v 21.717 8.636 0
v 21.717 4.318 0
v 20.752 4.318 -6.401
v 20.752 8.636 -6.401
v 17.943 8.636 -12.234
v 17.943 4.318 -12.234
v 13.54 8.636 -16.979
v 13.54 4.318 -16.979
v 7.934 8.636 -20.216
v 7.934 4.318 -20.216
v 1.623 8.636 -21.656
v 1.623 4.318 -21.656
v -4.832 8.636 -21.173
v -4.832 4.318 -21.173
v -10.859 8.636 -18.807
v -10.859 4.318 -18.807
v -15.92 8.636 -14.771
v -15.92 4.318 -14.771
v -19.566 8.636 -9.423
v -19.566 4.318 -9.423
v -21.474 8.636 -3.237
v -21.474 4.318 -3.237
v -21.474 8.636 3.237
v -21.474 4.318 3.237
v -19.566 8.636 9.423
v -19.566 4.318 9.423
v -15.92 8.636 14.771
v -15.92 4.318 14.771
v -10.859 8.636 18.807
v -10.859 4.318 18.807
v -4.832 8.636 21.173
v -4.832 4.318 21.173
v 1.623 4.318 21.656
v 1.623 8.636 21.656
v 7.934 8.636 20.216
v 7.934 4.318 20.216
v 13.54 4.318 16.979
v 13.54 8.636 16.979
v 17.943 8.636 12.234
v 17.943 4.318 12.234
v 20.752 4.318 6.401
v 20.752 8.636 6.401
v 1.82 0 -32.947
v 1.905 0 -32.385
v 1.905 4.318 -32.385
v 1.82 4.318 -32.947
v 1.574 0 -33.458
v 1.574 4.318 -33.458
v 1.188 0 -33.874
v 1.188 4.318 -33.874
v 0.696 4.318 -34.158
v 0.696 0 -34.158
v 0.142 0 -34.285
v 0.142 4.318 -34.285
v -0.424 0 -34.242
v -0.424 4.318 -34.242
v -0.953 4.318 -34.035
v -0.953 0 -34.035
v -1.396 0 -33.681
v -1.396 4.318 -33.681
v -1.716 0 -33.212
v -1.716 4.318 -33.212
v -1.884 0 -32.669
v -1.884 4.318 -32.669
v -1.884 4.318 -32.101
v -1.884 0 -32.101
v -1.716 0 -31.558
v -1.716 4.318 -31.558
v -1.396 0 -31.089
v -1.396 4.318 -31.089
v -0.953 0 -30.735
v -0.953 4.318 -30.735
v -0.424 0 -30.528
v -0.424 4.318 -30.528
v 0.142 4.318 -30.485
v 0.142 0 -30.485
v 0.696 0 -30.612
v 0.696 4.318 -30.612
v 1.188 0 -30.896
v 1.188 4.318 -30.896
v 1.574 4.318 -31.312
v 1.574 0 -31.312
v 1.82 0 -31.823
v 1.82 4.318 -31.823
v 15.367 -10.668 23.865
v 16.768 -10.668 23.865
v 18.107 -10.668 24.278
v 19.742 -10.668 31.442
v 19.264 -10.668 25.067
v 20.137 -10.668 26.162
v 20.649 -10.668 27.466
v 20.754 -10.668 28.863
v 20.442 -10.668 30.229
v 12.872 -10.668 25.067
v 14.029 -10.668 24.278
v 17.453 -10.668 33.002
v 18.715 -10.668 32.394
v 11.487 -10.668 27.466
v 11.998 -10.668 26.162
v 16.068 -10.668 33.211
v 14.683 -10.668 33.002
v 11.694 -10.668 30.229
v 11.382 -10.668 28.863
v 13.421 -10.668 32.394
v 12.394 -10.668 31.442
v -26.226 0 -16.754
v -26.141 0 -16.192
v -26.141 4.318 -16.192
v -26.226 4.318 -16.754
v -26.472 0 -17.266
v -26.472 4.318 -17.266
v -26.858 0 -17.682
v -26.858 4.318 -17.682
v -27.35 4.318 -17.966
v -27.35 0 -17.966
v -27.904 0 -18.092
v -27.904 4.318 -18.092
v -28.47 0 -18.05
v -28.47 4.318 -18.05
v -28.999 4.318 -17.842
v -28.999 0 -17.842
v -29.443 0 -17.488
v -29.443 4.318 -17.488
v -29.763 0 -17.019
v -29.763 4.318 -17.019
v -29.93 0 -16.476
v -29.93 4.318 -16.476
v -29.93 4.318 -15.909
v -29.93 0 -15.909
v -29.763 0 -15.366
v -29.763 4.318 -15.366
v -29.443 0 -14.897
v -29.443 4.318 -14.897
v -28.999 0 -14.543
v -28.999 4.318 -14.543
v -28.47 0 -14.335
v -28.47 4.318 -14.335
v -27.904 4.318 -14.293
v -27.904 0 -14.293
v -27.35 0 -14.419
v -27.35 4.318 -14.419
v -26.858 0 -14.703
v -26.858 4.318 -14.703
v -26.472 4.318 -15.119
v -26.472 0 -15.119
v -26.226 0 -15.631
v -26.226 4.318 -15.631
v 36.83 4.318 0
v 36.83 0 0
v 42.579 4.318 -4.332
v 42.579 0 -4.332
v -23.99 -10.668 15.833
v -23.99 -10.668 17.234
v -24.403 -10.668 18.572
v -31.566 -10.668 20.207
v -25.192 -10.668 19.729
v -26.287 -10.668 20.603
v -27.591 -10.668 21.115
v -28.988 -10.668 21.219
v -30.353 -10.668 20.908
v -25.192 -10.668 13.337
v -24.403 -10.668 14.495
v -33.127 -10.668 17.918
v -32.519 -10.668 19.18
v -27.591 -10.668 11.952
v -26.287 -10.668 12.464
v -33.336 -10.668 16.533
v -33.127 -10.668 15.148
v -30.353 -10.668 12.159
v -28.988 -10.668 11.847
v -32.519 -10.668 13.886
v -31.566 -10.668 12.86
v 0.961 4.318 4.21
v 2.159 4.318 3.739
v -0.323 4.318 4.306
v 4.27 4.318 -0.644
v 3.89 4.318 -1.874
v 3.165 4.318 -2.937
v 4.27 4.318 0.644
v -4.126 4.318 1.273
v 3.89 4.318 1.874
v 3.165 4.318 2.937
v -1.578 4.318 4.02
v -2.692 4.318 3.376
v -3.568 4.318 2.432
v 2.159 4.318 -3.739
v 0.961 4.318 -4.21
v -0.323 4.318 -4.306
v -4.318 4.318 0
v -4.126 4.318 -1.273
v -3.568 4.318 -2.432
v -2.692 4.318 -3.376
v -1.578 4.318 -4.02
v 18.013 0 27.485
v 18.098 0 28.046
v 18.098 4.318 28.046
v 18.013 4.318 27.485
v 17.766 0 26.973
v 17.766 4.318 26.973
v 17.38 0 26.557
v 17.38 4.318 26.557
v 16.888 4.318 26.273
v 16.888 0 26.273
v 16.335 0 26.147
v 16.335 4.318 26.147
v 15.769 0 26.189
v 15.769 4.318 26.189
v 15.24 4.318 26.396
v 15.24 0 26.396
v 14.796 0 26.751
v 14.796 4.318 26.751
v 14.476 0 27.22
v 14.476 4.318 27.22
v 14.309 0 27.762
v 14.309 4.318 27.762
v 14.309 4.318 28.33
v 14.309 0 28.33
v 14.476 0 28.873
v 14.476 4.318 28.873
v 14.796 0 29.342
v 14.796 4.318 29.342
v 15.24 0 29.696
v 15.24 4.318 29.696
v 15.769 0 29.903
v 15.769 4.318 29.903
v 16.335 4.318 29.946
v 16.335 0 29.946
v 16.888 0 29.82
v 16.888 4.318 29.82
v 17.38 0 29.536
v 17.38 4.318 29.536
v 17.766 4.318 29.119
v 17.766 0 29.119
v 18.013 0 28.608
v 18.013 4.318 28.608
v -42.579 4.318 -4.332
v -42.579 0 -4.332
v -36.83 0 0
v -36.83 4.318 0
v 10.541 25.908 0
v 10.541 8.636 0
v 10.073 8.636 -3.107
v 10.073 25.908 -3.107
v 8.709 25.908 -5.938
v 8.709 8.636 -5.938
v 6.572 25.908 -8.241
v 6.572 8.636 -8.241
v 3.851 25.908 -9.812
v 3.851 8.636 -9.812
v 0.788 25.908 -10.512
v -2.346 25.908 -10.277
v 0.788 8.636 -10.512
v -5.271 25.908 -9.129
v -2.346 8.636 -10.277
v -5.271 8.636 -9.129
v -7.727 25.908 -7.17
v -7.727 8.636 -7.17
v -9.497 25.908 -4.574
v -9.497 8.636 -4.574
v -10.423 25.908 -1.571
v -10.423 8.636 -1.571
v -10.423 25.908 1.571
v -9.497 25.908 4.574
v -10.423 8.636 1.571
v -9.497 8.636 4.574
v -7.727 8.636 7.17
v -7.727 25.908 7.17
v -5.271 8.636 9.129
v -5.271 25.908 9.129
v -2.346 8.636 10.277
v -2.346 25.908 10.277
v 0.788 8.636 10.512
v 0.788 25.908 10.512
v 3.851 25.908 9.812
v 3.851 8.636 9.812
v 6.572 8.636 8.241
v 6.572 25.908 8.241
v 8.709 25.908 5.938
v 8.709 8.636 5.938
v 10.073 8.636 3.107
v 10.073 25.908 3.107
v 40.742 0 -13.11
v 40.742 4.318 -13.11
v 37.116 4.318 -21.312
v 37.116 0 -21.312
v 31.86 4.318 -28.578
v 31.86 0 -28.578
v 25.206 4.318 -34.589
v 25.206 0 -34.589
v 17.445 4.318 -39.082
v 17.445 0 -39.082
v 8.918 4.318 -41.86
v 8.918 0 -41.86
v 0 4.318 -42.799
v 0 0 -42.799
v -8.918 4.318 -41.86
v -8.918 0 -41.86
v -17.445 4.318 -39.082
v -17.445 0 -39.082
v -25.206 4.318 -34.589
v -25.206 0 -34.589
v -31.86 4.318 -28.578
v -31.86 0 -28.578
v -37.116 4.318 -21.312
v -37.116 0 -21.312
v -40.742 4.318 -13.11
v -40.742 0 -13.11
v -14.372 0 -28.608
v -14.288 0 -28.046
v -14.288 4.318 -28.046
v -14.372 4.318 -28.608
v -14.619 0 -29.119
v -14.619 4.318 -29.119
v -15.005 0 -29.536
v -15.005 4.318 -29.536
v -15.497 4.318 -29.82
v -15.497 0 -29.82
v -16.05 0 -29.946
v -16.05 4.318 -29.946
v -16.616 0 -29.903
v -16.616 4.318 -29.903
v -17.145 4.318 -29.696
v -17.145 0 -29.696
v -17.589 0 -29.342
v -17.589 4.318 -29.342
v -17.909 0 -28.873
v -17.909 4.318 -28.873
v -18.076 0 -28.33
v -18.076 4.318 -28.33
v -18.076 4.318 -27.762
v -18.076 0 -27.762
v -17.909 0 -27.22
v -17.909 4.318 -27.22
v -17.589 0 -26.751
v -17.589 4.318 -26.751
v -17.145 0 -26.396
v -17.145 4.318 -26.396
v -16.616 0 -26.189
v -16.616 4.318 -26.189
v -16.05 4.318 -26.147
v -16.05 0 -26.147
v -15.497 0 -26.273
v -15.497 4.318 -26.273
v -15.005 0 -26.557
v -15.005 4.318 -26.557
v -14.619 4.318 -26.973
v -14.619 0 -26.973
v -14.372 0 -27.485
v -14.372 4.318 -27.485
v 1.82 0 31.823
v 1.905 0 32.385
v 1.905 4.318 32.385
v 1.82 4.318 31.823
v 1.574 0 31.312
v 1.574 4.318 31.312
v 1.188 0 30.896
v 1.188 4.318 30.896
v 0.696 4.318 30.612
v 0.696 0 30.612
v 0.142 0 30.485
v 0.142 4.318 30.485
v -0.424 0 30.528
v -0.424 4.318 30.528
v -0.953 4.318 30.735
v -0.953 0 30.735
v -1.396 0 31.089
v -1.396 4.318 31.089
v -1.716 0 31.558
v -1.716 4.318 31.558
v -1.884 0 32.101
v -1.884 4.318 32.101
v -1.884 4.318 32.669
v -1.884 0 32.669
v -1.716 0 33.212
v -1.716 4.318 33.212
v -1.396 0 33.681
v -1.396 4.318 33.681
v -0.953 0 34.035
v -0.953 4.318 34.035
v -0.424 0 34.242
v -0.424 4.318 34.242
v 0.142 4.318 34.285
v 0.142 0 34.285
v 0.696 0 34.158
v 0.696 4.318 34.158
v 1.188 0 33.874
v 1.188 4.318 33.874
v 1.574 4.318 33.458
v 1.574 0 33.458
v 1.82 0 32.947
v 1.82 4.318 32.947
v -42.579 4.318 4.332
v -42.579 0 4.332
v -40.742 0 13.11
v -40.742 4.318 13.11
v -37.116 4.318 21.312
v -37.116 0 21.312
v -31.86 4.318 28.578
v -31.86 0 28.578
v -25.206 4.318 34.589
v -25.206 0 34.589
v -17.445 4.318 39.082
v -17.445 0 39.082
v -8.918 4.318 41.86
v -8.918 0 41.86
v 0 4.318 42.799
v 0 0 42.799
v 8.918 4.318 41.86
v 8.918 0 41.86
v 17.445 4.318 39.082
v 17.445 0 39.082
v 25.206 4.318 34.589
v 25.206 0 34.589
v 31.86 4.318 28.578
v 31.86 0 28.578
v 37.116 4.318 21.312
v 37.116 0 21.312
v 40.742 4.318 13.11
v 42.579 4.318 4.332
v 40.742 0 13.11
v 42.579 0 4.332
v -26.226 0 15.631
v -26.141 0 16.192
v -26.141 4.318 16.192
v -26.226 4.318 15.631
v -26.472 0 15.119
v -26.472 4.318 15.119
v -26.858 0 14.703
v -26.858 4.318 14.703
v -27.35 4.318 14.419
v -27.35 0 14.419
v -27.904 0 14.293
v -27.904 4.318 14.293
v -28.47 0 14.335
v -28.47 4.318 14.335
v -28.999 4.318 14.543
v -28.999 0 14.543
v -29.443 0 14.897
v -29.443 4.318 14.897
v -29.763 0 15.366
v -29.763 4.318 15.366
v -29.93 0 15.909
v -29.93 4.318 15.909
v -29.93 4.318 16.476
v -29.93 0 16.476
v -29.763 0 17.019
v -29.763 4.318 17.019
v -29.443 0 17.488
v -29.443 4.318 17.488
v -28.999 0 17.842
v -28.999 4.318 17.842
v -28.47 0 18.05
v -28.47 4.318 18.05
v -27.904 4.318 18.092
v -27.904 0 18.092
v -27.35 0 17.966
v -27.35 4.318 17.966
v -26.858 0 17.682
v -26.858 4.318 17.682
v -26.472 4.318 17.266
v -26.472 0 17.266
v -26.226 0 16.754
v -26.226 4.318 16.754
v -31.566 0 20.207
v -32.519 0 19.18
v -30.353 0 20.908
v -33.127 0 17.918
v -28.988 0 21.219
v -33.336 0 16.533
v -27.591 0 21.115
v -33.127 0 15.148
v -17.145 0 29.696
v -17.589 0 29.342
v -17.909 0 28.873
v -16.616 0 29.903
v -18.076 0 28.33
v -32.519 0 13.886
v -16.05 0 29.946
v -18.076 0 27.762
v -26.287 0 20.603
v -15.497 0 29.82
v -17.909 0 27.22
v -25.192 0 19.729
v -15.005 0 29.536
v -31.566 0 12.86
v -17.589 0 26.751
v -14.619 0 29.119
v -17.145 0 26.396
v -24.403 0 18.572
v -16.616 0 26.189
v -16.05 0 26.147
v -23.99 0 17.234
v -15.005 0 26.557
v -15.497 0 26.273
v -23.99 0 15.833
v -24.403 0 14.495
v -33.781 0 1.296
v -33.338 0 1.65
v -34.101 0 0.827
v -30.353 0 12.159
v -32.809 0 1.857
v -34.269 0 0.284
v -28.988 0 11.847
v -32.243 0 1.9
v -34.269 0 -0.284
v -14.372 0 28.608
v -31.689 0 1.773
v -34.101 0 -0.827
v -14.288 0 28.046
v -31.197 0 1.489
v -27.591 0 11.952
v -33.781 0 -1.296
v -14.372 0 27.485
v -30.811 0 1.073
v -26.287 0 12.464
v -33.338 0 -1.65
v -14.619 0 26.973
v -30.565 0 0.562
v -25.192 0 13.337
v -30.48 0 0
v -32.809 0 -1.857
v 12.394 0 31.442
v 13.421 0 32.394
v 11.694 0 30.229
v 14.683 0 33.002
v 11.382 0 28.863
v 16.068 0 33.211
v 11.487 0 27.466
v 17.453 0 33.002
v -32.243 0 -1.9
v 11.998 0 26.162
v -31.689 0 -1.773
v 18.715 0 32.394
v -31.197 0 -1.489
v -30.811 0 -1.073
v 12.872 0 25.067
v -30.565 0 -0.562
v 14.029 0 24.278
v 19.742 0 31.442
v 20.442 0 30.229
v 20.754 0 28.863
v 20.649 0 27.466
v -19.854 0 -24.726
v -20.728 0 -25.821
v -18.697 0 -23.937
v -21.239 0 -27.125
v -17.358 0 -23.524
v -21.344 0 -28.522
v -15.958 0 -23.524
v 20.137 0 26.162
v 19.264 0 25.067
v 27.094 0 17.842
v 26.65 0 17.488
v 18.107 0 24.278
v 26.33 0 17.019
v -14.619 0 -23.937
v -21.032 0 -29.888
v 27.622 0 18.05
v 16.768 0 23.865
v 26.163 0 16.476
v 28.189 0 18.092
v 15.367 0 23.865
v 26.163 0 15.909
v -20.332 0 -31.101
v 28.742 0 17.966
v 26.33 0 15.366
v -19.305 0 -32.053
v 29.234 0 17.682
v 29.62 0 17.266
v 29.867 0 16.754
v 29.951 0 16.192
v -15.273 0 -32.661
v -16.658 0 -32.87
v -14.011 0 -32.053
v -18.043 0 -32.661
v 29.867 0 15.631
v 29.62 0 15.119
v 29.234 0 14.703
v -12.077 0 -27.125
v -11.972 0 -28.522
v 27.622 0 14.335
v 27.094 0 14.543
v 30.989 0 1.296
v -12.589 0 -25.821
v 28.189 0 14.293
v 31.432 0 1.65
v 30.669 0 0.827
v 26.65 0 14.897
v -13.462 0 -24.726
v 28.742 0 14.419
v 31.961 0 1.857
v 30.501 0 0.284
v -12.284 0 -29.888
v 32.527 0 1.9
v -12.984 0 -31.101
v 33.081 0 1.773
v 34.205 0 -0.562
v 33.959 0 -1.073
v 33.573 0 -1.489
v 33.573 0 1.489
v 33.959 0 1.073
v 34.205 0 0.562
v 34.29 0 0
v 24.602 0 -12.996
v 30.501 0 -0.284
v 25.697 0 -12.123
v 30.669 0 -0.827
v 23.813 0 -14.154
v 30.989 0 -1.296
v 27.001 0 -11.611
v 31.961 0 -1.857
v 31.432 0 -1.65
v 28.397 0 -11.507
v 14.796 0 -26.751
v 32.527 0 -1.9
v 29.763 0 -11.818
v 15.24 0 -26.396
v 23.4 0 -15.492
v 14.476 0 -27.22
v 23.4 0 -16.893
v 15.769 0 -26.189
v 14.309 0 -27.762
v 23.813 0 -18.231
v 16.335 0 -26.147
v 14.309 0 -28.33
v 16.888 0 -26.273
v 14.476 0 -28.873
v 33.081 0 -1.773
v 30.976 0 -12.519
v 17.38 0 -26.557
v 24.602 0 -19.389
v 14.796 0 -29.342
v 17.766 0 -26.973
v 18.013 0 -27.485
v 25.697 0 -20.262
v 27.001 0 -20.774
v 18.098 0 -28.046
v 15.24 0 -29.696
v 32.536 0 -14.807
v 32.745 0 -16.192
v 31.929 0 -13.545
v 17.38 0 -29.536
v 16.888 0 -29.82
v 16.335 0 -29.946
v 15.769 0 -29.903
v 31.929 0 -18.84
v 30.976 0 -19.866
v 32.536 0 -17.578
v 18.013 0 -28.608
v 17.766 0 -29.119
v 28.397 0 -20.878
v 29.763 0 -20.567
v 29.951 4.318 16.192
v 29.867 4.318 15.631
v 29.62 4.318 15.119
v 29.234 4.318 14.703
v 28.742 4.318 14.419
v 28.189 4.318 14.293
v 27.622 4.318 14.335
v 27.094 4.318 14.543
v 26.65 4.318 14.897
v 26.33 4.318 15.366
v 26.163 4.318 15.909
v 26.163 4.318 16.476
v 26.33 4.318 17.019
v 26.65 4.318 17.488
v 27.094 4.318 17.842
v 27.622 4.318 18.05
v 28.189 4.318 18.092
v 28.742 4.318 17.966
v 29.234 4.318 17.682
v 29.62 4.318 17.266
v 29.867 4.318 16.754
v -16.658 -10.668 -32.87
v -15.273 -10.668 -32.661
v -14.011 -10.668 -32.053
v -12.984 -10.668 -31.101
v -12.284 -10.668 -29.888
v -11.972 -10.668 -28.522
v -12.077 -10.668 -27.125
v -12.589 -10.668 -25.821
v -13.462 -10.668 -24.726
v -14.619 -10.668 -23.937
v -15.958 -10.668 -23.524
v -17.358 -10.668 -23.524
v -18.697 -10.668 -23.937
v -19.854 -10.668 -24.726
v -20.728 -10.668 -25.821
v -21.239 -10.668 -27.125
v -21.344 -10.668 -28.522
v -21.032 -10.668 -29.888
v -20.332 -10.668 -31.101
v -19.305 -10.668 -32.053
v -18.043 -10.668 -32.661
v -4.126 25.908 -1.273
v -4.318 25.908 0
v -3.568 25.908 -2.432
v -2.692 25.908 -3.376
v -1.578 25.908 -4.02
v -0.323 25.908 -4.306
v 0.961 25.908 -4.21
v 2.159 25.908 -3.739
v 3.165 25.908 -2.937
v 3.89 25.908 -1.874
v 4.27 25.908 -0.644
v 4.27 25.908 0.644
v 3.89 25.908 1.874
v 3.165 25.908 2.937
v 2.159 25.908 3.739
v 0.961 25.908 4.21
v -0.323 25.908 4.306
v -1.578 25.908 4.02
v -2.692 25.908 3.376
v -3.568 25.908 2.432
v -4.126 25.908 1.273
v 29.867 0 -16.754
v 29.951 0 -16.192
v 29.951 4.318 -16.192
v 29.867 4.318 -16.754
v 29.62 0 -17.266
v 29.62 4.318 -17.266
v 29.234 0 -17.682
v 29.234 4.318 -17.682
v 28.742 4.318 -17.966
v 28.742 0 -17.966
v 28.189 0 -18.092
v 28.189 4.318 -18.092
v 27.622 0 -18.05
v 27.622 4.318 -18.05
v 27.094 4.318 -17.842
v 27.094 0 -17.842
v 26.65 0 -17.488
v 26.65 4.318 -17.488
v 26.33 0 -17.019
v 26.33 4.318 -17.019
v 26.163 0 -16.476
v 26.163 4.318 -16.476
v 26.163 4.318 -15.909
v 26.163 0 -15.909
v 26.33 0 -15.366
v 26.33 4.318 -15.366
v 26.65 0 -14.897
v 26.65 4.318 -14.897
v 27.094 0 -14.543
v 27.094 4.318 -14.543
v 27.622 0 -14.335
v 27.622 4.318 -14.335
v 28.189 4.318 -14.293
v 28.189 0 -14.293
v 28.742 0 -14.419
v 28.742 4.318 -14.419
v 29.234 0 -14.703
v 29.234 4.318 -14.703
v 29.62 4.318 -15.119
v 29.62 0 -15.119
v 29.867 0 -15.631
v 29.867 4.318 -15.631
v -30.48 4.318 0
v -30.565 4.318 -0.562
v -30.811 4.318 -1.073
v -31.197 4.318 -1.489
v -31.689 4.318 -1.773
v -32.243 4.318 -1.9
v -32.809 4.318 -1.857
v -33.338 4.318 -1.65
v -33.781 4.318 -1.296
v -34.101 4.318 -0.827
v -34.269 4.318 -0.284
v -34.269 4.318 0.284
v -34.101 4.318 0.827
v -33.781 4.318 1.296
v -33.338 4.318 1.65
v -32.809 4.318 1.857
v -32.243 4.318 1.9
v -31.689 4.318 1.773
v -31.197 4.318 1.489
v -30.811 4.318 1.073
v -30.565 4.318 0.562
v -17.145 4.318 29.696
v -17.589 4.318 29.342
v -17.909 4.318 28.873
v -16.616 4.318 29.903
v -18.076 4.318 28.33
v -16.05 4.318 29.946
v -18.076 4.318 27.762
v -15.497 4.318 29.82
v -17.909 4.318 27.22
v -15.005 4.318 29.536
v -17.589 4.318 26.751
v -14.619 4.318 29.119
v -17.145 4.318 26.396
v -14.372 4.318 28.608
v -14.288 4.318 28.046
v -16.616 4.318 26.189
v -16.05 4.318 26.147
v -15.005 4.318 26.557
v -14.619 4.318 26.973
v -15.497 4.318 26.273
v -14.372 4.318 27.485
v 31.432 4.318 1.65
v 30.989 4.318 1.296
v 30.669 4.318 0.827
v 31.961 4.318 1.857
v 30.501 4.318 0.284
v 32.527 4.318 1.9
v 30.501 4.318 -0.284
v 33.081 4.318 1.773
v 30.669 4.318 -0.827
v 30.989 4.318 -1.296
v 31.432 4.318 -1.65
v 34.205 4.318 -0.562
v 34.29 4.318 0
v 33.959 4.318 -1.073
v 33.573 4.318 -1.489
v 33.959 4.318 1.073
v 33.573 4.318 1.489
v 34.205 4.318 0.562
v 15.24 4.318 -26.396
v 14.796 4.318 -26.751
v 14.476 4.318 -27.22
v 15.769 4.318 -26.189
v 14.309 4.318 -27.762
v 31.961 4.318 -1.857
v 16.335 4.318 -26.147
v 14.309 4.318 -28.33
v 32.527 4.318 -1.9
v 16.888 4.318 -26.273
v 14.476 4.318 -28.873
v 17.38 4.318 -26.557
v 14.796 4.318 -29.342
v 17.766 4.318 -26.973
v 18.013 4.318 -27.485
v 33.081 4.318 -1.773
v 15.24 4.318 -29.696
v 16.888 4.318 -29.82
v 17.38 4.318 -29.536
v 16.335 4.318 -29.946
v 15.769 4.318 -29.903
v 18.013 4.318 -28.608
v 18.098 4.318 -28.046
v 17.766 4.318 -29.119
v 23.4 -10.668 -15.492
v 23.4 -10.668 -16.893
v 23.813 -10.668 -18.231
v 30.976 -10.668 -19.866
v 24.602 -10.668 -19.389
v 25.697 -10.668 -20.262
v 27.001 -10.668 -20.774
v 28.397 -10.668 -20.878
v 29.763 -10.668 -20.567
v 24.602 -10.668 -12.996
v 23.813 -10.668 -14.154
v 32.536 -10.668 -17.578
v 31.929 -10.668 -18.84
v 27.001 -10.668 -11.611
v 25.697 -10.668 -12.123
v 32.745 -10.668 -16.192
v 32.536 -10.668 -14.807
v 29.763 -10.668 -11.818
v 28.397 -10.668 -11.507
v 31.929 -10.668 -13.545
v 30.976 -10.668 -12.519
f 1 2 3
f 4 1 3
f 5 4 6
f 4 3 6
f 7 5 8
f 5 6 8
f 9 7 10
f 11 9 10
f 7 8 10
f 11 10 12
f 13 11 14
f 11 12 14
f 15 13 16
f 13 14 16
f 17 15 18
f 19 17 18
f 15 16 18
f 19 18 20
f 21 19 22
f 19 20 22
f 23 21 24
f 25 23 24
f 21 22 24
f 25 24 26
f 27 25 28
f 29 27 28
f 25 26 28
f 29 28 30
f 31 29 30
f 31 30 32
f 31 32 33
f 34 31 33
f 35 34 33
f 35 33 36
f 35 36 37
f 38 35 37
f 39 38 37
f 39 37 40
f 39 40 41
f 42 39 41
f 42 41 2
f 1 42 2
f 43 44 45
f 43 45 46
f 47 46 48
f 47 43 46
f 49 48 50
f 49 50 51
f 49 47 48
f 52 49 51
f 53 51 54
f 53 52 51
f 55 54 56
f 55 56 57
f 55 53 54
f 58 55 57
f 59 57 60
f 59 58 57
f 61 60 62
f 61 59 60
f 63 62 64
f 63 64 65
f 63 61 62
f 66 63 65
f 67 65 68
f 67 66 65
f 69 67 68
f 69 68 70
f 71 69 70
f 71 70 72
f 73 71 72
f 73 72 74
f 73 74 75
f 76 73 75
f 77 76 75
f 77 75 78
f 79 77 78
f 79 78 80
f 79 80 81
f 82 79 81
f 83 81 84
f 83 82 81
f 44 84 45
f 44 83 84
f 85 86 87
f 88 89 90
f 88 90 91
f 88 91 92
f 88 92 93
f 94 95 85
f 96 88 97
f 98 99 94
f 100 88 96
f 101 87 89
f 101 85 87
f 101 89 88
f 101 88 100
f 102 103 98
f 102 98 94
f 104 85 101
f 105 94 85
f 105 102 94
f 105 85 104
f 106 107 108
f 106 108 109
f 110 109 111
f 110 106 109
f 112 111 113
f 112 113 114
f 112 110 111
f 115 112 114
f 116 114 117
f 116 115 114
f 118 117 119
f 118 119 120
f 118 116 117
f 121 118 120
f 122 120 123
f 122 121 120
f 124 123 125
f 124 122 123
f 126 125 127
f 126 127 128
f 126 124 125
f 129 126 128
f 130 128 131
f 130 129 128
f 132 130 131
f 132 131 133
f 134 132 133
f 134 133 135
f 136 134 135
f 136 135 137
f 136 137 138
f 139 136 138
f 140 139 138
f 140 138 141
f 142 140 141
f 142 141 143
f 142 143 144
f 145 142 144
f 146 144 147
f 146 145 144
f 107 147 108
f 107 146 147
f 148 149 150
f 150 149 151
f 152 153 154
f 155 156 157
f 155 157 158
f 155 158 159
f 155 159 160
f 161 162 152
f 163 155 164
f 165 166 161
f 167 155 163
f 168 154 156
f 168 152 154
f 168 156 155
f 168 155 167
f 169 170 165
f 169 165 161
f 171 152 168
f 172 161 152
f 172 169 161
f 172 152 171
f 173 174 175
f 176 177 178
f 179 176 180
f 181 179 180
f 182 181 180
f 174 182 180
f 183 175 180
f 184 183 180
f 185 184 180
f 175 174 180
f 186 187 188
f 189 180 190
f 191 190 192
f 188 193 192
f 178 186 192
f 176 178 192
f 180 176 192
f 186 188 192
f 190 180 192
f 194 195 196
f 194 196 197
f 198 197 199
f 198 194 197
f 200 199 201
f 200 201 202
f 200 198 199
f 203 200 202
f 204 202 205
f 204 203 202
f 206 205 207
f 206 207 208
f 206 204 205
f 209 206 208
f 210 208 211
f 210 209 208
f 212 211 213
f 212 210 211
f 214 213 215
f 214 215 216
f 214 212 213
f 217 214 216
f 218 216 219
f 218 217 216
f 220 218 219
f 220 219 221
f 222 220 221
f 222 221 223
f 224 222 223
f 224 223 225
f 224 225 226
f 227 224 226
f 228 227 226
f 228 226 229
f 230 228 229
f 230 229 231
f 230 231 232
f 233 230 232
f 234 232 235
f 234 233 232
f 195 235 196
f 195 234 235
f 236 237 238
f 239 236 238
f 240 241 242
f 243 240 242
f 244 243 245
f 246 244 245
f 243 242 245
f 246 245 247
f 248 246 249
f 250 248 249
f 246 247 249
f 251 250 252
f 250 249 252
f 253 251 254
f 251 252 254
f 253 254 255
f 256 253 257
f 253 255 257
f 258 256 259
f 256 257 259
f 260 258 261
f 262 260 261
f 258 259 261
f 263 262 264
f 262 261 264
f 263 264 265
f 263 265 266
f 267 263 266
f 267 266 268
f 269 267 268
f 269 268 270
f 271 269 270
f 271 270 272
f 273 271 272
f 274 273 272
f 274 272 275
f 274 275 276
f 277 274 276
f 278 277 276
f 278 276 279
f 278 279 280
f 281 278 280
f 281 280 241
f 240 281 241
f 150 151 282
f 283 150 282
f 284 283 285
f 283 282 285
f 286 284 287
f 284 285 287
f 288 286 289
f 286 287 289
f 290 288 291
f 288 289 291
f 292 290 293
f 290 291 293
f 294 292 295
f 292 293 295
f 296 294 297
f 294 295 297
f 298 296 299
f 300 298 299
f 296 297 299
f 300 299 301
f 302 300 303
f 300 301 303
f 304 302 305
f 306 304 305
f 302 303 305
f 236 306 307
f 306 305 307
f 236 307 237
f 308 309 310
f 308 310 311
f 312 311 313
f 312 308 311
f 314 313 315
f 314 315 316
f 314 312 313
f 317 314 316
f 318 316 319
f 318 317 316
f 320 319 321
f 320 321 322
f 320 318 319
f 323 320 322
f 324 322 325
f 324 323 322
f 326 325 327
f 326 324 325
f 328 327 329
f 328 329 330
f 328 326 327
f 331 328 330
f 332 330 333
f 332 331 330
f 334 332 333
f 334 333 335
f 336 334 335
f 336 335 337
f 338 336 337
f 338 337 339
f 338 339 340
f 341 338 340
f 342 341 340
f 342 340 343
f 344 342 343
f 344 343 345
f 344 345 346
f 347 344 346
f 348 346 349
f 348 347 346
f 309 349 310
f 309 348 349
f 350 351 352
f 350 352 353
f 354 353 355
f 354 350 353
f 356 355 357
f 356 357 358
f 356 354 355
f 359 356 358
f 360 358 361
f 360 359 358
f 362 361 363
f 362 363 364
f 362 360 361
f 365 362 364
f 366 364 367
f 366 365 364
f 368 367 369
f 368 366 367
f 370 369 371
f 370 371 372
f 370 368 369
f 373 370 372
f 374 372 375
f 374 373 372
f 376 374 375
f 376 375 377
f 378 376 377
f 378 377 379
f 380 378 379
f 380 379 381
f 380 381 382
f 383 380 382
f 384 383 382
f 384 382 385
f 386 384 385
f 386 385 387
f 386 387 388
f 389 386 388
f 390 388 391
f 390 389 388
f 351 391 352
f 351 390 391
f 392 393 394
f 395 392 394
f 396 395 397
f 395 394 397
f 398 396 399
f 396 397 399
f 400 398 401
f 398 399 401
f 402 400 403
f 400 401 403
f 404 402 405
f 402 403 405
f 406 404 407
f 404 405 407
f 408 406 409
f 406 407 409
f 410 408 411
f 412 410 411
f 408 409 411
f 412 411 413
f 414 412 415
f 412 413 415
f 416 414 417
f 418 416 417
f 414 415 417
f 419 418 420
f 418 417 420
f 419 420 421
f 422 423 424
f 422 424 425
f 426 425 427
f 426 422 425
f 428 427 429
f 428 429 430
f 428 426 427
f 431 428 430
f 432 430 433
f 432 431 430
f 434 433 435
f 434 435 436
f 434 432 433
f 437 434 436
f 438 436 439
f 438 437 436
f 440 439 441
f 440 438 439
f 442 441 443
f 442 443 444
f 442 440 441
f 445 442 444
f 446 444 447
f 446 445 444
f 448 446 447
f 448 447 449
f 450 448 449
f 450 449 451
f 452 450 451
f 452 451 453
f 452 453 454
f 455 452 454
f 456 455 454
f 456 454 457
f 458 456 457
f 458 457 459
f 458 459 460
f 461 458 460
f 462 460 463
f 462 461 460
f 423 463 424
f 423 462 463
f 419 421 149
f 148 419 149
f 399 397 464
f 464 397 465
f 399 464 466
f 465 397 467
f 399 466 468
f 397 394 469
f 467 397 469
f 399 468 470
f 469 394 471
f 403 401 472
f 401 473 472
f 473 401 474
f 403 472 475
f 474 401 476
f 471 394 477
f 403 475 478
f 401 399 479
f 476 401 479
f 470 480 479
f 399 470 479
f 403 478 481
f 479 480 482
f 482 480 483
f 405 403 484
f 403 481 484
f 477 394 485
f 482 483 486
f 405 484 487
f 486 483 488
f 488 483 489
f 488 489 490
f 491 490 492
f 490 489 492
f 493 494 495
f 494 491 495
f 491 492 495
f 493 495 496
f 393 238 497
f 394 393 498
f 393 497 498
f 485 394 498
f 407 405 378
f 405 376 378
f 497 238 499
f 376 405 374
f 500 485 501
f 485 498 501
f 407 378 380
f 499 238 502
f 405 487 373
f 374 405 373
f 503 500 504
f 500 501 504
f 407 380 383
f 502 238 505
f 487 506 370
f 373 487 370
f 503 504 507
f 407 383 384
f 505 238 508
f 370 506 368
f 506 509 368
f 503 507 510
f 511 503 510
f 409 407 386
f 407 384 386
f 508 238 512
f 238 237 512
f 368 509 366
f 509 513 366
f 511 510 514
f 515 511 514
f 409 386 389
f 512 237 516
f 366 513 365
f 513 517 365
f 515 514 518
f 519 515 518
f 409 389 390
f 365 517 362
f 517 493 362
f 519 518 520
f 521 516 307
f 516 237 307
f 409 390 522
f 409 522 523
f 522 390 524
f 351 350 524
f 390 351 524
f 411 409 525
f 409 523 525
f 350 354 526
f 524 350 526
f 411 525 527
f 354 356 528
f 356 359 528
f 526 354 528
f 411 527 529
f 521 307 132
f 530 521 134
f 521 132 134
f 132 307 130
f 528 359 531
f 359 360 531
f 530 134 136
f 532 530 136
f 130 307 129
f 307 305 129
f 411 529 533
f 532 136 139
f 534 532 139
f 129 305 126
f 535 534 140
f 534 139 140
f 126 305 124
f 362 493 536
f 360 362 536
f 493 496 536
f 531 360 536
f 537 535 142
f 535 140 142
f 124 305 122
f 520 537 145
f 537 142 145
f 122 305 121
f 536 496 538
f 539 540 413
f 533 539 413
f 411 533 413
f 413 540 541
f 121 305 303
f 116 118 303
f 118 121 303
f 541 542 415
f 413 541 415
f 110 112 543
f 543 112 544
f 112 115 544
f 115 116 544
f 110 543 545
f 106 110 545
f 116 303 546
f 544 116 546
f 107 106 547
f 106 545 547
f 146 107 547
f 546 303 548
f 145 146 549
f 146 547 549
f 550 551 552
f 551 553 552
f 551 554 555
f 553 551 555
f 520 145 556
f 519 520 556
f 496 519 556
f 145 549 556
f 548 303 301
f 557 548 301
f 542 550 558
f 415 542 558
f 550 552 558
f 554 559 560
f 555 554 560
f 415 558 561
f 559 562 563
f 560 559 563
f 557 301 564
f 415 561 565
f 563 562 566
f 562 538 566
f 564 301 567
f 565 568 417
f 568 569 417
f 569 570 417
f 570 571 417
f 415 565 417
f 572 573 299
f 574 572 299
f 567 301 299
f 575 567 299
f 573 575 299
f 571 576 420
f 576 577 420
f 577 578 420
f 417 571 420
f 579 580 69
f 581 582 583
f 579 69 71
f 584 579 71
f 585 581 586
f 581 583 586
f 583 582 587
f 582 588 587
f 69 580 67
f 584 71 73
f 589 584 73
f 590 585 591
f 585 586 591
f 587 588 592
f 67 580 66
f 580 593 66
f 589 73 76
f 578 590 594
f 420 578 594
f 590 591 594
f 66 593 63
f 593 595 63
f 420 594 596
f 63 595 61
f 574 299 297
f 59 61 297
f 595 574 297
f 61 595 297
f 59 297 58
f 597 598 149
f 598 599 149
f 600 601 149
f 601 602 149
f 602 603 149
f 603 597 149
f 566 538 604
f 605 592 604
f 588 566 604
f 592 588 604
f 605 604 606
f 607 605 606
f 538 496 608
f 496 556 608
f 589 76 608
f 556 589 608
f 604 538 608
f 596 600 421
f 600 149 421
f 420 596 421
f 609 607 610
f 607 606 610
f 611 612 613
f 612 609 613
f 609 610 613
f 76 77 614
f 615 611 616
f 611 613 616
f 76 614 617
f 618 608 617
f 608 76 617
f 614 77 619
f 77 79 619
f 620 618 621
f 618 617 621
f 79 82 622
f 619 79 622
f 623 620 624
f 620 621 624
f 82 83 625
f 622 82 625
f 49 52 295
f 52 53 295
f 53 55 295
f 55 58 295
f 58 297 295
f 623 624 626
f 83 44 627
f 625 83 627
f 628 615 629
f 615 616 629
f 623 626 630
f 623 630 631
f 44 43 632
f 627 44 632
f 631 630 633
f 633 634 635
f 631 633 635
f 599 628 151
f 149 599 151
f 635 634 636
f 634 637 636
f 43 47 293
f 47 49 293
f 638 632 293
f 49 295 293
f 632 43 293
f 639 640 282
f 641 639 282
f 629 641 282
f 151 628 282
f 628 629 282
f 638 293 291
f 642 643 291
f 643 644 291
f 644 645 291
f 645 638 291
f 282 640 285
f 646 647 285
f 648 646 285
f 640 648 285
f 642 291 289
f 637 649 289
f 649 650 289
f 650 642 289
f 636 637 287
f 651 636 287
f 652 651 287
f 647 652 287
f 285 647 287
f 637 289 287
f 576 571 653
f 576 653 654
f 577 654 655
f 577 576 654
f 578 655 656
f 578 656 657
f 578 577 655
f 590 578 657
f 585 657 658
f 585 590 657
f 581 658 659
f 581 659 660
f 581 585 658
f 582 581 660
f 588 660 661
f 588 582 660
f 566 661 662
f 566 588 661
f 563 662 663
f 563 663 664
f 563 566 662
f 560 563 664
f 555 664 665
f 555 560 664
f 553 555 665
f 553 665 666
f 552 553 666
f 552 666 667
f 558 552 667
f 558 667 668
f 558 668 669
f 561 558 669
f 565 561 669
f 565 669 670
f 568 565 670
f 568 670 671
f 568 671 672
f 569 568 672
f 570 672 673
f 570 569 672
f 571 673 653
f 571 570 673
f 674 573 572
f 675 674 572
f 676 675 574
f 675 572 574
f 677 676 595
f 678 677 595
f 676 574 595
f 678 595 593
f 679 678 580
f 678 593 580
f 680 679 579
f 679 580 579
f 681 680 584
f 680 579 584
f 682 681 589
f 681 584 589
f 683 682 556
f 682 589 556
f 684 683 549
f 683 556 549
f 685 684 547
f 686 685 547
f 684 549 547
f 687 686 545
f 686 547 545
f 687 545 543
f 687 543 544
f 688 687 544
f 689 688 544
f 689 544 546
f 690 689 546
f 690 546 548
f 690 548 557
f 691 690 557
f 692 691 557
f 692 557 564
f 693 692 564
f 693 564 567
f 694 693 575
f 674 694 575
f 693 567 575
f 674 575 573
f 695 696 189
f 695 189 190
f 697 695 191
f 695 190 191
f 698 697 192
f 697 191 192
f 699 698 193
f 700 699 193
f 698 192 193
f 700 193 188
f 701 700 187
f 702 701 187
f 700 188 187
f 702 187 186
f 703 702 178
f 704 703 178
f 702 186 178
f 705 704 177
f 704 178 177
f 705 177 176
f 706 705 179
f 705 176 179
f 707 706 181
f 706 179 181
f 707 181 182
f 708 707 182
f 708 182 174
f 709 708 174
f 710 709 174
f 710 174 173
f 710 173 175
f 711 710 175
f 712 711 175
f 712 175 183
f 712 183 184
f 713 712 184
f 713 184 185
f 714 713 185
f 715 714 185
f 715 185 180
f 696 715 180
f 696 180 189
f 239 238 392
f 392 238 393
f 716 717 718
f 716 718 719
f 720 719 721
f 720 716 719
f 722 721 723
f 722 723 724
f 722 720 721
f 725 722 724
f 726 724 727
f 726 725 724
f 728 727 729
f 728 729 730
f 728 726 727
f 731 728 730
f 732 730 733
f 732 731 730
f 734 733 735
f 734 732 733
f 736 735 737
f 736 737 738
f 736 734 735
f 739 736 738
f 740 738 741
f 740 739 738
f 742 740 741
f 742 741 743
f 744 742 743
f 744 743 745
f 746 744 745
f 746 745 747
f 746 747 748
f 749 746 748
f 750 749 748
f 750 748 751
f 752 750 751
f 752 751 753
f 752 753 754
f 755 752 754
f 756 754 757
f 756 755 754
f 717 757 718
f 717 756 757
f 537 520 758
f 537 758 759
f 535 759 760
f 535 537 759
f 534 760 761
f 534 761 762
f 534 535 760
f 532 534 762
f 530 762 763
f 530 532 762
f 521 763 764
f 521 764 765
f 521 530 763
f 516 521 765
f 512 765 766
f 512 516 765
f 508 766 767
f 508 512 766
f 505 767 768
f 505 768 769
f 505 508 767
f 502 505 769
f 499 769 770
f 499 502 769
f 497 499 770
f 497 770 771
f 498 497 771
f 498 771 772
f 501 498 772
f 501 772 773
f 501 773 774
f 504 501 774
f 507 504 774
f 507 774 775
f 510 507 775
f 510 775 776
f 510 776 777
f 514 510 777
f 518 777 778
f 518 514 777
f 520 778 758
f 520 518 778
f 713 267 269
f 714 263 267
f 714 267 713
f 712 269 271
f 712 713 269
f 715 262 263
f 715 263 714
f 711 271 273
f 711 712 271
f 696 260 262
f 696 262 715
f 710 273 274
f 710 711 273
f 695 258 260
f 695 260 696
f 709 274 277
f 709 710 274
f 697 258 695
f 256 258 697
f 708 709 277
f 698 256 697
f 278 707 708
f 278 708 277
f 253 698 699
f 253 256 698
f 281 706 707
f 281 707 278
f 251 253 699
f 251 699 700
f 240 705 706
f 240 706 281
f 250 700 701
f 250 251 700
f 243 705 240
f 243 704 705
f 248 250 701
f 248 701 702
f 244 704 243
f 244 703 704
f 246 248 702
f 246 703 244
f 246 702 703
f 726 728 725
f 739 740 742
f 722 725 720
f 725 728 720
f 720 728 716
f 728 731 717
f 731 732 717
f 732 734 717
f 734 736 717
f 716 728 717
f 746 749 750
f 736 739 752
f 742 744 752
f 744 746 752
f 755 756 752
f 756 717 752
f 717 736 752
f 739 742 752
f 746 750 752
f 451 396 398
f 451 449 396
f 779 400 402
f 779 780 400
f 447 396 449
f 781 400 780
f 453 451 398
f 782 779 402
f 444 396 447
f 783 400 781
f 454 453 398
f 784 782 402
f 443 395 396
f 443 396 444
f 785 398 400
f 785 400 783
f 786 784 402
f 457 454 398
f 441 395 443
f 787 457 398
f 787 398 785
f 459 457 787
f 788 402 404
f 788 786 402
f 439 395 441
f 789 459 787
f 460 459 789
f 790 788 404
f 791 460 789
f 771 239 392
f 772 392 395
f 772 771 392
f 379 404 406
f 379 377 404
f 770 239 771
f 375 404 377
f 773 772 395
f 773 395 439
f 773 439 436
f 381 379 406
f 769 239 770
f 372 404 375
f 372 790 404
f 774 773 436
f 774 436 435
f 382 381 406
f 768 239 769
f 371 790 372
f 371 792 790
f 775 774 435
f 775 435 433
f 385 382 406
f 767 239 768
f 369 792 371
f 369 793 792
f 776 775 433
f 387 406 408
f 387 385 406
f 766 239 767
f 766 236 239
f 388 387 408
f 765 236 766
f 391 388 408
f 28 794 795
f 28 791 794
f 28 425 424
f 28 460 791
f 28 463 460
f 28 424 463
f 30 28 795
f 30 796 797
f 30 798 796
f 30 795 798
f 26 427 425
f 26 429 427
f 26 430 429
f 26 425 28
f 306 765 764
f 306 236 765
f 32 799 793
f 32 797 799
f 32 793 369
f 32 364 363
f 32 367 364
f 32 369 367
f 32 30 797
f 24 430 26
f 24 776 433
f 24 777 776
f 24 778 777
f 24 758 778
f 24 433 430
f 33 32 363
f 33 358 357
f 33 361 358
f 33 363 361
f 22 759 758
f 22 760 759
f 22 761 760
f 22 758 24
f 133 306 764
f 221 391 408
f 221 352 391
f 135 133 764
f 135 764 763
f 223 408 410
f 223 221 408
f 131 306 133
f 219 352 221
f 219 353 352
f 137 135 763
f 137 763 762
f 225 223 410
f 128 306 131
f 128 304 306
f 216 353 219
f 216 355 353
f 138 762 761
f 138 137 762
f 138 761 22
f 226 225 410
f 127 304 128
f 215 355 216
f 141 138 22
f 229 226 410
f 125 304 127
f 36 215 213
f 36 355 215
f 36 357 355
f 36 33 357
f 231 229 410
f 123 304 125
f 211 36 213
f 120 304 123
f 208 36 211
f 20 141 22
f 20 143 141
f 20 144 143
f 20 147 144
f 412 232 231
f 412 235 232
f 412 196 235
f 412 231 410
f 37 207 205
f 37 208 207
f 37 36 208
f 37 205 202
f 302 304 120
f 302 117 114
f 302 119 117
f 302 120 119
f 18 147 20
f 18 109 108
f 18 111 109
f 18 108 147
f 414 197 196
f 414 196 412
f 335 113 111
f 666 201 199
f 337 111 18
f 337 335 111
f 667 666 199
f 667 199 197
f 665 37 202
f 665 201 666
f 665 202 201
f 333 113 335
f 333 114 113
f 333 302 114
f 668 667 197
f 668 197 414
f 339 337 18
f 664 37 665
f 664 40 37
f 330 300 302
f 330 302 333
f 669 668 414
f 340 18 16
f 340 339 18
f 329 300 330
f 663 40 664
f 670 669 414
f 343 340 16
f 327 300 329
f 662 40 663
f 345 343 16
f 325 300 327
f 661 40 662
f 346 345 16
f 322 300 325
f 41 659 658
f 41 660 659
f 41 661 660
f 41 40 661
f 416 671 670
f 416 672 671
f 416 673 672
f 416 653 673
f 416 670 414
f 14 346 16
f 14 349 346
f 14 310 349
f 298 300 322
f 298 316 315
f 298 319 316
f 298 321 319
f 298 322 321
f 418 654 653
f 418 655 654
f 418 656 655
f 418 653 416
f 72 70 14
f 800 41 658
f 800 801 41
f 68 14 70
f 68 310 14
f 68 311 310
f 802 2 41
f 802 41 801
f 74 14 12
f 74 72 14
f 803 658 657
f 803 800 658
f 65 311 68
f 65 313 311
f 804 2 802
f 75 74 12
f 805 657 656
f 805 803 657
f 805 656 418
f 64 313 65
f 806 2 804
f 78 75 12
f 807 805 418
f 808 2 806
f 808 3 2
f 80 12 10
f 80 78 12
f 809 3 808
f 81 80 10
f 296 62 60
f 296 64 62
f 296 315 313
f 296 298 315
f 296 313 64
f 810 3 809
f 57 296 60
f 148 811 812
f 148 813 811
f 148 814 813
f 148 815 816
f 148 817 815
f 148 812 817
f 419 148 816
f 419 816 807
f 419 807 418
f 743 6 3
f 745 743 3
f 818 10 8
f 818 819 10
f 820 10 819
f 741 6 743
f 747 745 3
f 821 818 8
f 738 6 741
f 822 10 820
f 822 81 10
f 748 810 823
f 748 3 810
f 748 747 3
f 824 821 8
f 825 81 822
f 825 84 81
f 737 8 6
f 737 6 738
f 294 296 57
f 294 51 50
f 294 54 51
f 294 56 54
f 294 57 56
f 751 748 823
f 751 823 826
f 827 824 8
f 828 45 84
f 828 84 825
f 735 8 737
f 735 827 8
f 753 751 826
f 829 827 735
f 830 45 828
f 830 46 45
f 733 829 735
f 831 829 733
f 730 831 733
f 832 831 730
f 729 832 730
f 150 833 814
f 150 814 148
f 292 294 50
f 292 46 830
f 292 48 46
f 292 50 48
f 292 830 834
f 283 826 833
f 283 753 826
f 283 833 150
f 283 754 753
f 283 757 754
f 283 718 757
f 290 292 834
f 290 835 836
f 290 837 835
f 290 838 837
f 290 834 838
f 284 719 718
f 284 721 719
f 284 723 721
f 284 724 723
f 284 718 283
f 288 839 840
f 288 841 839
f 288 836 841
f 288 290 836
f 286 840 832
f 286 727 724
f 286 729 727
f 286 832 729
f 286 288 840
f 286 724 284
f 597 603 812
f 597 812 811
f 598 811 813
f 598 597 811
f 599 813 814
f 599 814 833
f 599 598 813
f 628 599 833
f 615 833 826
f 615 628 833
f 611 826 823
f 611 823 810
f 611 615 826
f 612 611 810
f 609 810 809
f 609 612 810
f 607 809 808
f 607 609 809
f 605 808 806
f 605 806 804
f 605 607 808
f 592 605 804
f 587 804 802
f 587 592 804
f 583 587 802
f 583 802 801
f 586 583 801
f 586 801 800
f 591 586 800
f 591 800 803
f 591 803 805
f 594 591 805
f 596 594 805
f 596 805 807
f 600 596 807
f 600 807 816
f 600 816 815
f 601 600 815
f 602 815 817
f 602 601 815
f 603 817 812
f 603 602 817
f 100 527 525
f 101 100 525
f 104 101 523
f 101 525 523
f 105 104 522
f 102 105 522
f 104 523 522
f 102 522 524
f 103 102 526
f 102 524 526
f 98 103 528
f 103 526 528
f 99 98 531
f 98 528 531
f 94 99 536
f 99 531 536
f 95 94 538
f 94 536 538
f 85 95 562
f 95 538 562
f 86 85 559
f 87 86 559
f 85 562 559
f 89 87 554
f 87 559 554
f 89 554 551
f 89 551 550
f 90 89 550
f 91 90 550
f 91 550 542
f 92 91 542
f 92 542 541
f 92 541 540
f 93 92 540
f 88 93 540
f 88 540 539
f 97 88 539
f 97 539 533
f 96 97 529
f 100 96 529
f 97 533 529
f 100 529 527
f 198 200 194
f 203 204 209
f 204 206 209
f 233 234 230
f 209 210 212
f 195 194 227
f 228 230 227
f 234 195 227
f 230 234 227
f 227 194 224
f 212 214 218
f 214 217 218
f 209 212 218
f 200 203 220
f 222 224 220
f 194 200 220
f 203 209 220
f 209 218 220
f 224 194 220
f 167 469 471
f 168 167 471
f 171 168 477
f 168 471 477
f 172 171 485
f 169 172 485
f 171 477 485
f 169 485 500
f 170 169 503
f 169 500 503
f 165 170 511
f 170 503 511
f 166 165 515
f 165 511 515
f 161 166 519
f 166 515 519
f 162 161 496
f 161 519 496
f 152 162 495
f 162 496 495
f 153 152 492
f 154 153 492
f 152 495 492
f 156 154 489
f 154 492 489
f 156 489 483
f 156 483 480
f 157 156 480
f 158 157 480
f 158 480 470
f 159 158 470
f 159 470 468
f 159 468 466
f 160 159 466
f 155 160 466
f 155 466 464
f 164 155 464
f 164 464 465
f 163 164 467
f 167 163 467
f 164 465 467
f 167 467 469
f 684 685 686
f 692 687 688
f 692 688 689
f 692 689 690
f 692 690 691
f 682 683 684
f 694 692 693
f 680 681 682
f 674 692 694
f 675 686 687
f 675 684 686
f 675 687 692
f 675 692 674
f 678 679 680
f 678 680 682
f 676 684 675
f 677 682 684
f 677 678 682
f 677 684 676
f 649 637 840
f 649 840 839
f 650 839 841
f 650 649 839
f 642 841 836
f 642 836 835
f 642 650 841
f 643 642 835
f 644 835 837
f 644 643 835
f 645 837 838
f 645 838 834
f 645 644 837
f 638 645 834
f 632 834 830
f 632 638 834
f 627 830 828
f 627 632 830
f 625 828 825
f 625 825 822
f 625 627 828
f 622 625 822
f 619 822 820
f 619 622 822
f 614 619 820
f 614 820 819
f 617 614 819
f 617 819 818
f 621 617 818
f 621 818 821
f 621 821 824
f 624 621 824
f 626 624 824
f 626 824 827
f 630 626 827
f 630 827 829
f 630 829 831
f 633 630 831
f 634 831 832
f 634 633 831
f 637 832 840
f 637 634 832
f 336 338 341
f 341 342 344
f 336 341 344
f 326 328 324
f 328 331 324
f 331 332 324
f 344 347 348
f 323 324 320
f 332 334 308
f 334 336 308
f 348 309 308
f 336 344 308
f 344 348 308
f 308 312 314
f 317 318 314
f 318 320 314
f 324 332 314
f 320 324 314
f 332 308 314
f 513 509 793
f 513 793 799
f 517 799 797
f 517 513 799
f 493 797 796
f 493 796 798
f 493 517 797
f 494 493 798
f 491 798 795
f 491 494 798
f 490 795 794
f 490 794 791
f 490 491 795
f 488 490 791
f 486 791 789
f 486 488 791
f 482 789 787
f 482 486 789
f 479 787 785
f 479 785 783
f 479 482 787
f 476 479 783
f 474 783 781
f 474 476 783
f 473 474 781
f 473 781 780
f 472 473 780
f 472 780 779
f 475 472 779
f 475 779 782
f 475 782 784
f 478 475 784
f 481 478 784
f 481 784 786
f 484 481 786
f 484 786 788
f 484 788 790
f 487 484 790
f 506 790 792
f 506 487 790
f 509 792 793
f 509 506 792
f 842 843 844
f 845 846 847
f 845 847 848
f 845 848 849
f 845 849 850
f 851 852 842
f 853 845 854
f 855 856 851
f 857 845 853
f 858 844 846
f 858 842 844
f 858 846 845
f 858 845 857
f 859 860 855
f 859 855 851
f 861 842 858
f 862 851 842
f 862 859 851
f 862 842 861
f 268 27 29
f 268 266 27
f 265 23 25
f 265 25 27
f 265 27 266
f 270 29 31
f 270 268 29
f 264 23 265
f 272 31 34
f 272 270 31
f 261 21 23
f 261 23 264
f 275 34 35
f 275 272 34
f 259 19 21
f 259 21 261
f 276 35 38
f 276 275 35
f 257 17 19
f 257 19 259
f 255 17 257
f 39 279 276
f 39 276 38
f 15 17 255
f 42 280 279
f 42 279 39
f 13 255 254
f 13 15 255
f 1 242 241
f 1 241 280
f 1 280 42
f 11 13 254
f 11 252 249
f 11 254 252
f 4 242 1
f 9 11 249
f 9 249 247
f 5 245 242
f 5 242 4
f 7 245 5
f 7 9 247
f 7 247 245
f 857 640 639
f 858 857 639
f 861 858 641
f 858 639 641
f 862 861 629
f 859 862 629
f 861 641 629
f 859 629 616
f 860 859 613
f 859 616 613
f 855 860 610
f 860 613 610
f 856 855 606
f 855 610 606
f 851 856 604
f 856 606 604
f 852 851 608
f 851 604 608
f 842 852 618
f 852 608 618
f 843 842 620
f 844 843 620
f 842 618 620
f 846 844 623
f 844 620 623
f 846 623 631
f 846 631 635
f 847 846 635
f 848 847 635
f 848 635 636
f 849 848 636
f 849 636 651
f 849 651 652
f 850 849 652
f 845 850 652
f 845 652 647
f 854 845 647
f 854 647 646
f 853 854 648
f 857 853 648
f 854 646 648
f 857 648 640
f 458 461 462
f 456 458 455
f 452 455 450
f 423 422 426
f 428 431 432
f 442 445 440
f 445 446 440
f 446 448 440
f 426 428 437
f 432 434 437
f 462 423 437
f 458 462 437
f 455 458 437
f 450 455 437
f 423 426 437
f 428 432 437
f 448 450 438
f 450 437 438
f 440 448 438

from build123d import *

# Parameters (mm, degrees)
CROQUIS1_R              = 1.905
CROQUIS1_R_2            = 21.717
SALIENTE_EXTRUIR1_DEPTH = 4.318
CROQUIS1_3_R            = 21.717
CROQUIS1_3_R_2          = 10.541
SALIENTE_EXTRUIR2_DEPTH = 8.636
CROQUIS1_4_R            = 10.541
SALIENTE_EXTRUIR3_DEPTH = 25.908
TALADRO1_D              = 8.636
TALADRO1_DEPTH          = 21.59
CROQUIS5_R              = 4.699
SALIENTE_EXTRUIR4_DEPTH = 10.668
MATRIZC1_COUNT          = 4


with BuildPart() as part:
    # Croquis1 → Saliente-Extruir1 (new body)
    with BuildSketch(Plane(origin=(0, 0, 0), x_dir=(1, 0, 0), z_dir=(0, 1, 0))):
        with BuildLine():
            Line((-36.83, 0), (-42.579167494, -4.33230845))
            ThreePointArc((-42.579167494, -4.33230845), (0, -42.799), (42.579167494, -4.33230845))
            Line((42.579167494, -4.33230845), (36.83, 0))
            Line((36.83, 0), (42.579167494, 4.33230845))
            ThreePointArc((42.579167494, 4.33230845), (0, 42.799), (-42.579167494, 4.33230845))
            Line((-42.579167494, 4.33230845), (-36.83, 0))
        make_face()
        with Locations((32.385, 0)):
            Circle(CROQUIS1_R, mode=Mode.SUBTRACT)
        with Locations((28.046232702, 16.1925)):
            Circle(CROQUIS1_R, mode=Mode.SUBTRACT)
        with Locations((16.1925, 28.046232702)):
            Circle(CROQUIS1_R, mode=Mode.SUBTRACT)
        with Locations((0, 32.385)):
            Circle(CROQUIS1_R, mode=Mode.SUBTRACT)
        with Locations((-16.1925, 28.046232702)):
            Circle(CROQUIS1_R, mode=Mode.SUBTRACT)
        with Locations((-28.046232702, 16.1925)):
            Circle(CROQUIS1_R, mode=Mode.SUBTRACT)
        with Locations((-32.385, 0)):
            Circle(CROQUIS1_R, mode=Mode.SUBTRACT)
        with Locations((-28.046232702, -16.1925)):
            Circle(CROQUIS1_R, mode=Mode.SUBTRACT)
        with Locations((-16.1925, -28.046232702)):
            Circle(CROQUIS1_R, mode=Mode.SUBTRACT)
        with Locations((0, -32.385)):
            Circle(CROQUIS1_R, mode=Mode.SUBTRACT)
        with Locations((16.1925, -28.046232702)):
            Circle(CROQUIS1_R, mode=Mode.SUBTRACT)
        with Locations((28.046232702, -16.1925)):
            Circle(CROQUIS1_R, mode=Mode.SUBTRACT)
        Circle(CROQUIS1_R_2, mode=Mode.SUBTRACT)
    extrude(amount=SALIENTE_EXTRUIR1_DEPTH)

    # Croquis1<3> → Saliente-Extruir2 (add)
    with BuildSketch(Plane(origin=(0, 0, 0), x_dir=(1, 0, 0), z_dir=(0, 1, 0))):
        Circle(CROQUIS1_3_R)
        Circle(CROQUIS1_3_R_2, mode=Mode.SUBTRACT)
    extrude(amount=SALIENTE_EXTRUIR2_DEPTH)

    # Croquis1<4> → Saliente-Extruir3 (add)
    with BuildSketch(Plane(origin=(0, 0, 0), x_dir=(1, 0, 0), z_dir=(0, 1, 0))):
        Circle(CROQUIS1_4_R)
    extrude(amount=SALIENTE_EXTRUIR3_DEPTH)

    # Taladro1
    with Locations(Plane(origin=(0, 25.908, 0), x_dir=(1, 0, 0), z_dir=(0, 1, 0))):
        with Locations((0, 0)):
            Hole(TALADRO1_D / 2, depth=TALADRO1_DEPTH)

    # Croquis5 → Saliente-Extruir4 (add)
    with BuildSketch(Plane.XZ):
        with Locations((28.046232702, -16.1925)):
            Circle(CROQUIS5_R)
    saliente_extruir4 = extrude(amount=SALIENTE_EXTRUIR4_DEPTH)

    # MatrizC1: Saliente-Extruir4 ×4 about axis
    matrizc1_axis = Axis((-0.295191575, 0, 0.170428935), (0, 1, 0))
    for i in range(1, MATRIZC1_COUNT):
        add(saliente_extruir4.rotate(matrizc1_axis, i * 360 / MATRIZC1_COUNT))


solid = part.part
